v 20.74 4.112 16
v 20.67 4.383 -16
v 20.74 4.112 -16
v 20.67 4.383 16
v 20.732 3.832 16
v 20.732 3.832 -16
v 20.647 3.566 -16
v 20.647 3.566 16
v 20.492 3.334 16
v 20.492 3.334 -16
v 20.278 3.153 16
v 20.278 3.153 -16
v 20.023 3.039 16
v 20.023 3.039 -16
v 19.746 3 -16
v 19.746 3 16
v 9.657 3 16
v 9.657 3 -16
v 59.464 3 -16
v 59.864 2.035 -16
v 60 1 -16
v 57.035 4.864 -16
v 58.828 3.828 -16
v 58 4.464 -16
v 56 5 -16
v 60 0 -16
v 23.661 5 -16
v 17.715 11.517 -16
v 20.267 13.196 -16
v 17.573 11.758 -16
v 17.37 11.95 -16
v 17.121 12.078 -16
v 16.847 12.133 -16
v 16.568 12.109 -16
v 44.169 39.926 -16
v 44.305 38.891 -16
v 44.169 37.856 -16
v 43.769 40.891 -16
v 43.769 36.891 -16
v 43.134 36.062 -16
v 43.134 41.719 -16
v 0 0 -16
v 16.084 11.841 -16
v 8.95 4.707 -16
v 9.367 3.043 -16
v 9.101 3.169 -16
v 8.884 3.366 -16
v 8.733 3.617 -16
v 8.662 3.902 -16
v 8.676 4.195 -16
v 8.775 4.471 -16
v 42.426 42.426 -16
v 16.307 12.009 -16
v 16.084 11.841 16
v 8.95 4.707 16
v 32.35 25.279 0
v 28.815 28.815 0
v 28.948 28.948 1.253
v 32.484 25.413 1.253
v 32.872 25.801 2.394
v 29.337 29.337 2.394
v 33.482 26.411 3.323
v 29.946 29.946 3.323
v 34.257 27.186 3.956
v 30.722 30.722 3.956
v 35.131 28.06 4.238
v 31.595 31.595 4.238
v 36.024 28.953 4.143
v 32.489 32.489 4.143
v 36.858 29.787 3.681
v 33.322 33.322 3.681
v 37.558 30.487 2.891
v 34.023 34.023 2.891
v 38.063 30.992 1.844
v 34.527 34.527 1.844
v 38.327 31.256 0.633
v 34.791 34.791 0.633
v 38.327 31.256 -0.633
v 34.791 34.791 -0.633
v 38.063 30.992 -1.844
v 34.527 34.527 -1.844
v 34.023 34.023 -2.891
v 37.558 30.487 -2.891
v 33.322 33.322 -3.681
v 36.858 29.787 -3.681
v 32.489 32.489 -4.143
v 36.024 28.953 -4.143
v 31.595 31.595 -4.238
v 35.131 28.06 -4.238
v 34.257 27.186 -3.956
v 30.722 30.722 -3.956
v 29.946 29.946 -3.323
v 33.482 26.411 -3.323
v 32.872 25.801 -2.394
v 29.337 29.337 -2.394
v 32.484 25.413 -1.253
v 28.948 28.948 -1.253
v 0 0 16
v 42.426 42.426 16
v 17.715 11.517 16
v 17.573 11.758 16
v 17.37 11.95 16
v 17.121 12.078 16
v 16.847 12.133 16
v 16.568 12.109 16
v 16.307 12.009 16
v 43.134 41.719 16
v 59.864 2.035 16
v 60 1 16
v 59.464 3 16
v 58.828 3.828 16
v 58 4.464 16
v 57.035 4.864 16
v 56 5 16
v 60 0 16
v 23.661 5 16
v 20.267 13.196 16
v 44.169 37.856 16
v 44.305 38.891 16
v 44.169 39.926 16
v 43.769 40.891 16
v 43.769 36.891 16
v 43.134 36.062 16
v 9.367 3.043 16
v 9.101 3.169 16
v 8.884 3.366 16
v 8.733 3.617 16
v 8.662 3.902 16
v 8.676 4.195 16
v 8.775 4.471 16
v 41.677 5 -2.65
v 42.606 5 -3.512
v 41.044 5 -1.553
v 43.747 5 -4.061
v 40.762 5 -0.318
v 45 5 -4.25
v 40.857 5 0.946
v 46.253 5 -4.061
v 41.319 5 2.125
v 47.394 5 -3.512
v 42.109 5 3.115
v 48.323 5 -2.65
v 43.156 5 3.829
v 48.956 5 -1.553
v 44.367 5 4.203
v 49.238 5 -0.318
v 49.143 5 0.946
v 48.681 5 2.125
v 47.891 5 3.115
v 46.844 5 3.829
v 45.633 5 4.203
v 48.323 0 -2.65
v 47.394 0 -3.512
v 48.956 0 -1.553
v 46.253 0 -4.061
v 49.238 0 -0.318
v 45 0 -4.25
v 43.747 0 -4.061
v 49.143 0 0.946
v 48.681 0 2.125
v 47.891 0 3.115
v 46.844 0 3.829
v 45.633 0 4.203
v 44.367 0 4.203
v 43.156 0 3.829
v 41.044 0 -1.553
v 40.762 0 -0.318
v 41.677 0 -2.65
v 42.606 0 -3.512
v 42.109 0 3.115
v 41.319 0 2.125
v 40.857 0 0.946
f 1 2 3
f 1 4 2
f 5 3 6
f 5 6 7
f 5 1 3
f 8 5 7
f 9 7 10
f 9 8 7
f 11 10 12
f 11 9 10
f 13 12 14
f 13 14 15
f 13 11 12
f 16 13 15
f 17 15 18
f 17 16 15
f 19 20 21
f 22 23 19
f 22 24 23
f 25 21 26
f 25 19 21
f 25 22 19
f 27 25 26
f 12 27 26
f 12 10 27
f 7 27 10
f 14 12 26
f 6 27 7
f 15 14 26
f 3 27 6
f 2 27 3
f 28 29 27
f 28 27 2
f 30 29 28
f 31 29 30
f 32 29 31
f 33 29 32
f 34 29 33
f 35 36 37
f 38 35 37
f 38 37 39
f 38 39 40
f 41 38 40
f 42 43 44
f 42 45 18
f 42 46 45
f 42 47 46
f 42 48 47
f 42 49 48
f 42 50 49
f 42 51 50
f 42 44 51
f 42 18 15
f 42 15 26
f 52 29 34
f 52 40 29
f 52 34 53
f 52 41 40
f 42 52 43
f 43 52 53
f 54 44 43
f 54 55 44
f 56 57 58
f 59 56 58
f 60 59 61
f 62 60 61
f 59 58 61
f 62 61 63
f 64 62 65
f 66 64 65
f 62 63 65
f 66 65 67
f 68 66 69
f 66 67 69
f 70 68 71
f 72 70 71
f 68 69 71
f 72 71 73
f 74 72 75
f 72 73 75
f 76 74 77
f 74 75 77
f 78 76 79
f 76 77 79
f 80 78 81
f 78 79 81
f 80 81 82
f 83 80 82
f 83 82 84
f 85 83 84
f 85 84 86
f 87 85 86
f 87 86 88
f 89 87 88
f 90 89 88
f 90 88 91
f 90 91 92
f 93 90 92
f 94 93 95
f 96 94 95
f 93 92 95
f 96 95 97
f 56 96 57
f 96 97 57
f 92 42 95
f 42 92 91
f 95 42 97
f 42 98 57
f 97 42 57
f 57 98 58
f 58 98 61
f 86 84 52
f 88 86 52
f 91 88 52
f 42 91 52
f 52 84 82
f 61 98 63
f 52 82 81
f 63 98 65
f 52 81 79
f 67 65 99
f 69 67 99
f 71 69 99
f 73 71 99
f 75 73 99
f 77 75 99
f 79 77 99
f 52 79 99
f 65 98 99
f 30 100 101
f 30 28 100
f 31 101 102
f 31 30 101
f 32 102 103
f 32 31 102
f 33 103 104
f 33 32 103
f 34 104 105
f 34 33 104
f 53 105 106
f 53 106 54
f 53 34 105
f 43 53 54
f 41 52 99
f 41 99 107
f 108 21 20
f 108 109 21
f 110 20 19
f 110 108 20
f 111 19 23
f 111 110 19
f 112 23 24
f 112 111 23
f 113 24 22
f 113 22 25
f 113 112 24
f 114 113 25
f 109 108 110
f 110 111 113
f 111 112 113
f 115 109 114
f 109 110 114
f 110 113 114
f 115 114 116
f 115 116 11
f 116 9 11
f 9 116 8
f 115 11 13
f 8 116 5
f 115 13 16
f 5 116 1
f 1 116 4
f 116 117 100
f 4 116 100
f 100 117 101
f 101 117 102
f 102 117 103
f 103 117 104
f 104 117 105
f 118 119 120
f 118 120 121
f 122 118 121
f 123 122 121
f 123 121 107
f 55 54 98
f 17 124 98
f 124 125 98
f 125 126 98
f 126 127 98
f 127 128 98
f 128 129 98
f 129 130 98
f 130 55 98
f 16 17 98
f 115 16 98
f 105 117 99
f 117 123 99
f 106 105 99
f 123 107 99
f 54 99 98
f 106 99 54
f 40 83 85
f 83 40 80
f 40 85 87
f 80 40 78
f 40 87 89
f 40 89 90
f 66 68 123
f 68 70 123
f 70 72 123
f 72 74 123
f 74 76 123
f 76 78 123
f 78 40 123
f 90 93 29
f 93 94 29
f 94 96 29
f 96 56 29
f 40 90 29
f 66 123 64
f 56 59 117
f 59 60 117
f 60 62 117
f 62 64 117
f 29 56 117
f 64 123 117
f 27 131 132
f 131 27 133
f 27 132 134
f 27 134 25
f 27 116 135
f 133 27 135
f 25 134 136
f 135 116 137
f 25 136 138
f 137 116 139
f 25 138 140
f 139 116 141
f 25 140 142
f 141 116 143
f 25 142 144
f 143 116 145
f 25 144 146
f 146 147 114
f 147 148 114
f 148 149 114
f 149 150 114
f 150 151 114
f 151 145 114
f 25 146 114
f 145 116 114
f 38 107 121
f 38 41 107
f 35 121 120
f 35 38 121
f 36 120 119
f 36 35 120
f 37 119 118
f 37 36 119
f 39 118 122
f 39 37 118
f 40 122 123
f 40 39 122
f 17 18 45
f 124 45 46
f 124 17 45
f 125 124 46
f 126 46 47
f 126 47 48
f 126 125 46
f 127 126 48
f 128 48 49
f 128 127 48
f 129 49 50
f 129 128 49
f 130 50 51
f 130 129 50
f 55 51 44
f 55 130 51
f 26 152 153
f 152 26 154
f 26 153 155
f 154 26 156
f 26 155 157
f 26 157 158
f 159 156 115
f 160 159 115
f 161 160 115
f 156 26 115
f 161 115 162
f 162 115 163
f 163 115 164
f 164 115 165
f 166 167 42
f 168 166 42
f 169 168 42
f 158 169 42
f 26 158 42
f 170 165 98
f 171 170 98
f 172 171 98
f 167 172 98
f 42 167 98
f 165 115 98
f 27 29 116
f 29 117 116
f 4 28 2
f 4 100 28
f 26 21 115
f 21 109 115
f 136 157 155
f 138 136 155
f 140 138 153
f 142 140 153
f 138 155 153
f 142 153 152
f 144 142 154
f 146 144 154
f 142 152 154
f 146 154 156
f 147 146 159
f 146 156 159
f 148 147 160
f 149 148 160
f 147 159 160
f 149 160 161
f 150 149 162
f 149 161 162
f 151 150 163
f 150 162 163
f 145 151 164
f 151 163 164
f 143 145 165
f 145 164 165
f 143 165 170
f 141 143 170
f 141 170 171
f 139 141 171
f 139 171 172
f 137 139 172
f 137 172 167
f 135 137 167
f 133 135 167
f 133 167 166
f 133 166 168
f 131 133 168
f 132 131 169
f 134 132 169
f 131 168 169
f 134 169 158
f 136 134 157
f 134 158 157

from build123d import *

# Parameters (mm, degrees)
EXTRUDE_1_DEPTH     = 16
SKETCH_2_R          = 4.25
CUT_EXTRUDE_1_DEPTH = 5
SKETCH_3_R          = 4.25
CUT_EXTRUDE_2_DEPTH = 5
FILLET_1_R          = 4
FILLET_2_R          = 1


with BuildPart() as part:
    # Эскиз1 → Бобышка-Вытянуть1 (new body, symmetric)
    with BuildSketch(Plane.XY):
        Polygon((0, 0), (42.426406871, 42.426406871), (45.961940777, 38.890872965), (20.266663343, 13.195595531), (23.661390163, 5), (60, 5), (60, 0), align=None)
        Polygon((17.142135624, 12.899494937), (21.242640687, 3), (7.242640687, 3), align=None, mode=Mode.SUBTRACT)
    extrude(amount=EXTRUDE_1_DEPTH, both=True)

    # Эскиз2 → Вырез-Вытянуть1 (cut)
    with BuildSketch(Plane(origin=(0, 0, 0), x_dir=(0, 0, 1), z_dir=(-0.707106781, 0.707106781, 0))):
        with Locations(Location((0, 45, 0), (0, 0, 270))):  # turned: the seam where the file's is
            Circle(SKETCH_2_R)
    extrude(amount=-CUT_EXTRUDE_1_DEPTH, mode=Mode.SUBTRACT)

    # Эскиз3 → Вырез-Вытянуть2 (cut)
    with BuildSketch(Plane.XZ):
        with Locations(Location((45, 0, 0), (0, 0, 270))):  # turned: the seam where the file's is
            Circle(SKETCH_3_R)
    extrude(amount=-CUT_EXTRUDE_2_DEPTH, mode=Mode.SUBTRACT)

    # Скругление1
    fillet_1_edges = [part.edges().sort_by_distance(p)[0] for p in [
        (45.961940777, 38.890872965, 0),
        (60, 5, 0),
    ]]
    fillet(fillet_1_edges, radius=FILLET_1_R)

    # Скругление2
    fillet_2_edges = [part.edges().sort_by_distance(p)[0] for p in [
        (17.142135624, 12.899494937, 0),
        (7.242640687, 3, 0),
        (21.242640687, 3, 0),
    ]]
    fillet(fillet_2_edges, radius=FILLET_2_R)


solid = part.part
